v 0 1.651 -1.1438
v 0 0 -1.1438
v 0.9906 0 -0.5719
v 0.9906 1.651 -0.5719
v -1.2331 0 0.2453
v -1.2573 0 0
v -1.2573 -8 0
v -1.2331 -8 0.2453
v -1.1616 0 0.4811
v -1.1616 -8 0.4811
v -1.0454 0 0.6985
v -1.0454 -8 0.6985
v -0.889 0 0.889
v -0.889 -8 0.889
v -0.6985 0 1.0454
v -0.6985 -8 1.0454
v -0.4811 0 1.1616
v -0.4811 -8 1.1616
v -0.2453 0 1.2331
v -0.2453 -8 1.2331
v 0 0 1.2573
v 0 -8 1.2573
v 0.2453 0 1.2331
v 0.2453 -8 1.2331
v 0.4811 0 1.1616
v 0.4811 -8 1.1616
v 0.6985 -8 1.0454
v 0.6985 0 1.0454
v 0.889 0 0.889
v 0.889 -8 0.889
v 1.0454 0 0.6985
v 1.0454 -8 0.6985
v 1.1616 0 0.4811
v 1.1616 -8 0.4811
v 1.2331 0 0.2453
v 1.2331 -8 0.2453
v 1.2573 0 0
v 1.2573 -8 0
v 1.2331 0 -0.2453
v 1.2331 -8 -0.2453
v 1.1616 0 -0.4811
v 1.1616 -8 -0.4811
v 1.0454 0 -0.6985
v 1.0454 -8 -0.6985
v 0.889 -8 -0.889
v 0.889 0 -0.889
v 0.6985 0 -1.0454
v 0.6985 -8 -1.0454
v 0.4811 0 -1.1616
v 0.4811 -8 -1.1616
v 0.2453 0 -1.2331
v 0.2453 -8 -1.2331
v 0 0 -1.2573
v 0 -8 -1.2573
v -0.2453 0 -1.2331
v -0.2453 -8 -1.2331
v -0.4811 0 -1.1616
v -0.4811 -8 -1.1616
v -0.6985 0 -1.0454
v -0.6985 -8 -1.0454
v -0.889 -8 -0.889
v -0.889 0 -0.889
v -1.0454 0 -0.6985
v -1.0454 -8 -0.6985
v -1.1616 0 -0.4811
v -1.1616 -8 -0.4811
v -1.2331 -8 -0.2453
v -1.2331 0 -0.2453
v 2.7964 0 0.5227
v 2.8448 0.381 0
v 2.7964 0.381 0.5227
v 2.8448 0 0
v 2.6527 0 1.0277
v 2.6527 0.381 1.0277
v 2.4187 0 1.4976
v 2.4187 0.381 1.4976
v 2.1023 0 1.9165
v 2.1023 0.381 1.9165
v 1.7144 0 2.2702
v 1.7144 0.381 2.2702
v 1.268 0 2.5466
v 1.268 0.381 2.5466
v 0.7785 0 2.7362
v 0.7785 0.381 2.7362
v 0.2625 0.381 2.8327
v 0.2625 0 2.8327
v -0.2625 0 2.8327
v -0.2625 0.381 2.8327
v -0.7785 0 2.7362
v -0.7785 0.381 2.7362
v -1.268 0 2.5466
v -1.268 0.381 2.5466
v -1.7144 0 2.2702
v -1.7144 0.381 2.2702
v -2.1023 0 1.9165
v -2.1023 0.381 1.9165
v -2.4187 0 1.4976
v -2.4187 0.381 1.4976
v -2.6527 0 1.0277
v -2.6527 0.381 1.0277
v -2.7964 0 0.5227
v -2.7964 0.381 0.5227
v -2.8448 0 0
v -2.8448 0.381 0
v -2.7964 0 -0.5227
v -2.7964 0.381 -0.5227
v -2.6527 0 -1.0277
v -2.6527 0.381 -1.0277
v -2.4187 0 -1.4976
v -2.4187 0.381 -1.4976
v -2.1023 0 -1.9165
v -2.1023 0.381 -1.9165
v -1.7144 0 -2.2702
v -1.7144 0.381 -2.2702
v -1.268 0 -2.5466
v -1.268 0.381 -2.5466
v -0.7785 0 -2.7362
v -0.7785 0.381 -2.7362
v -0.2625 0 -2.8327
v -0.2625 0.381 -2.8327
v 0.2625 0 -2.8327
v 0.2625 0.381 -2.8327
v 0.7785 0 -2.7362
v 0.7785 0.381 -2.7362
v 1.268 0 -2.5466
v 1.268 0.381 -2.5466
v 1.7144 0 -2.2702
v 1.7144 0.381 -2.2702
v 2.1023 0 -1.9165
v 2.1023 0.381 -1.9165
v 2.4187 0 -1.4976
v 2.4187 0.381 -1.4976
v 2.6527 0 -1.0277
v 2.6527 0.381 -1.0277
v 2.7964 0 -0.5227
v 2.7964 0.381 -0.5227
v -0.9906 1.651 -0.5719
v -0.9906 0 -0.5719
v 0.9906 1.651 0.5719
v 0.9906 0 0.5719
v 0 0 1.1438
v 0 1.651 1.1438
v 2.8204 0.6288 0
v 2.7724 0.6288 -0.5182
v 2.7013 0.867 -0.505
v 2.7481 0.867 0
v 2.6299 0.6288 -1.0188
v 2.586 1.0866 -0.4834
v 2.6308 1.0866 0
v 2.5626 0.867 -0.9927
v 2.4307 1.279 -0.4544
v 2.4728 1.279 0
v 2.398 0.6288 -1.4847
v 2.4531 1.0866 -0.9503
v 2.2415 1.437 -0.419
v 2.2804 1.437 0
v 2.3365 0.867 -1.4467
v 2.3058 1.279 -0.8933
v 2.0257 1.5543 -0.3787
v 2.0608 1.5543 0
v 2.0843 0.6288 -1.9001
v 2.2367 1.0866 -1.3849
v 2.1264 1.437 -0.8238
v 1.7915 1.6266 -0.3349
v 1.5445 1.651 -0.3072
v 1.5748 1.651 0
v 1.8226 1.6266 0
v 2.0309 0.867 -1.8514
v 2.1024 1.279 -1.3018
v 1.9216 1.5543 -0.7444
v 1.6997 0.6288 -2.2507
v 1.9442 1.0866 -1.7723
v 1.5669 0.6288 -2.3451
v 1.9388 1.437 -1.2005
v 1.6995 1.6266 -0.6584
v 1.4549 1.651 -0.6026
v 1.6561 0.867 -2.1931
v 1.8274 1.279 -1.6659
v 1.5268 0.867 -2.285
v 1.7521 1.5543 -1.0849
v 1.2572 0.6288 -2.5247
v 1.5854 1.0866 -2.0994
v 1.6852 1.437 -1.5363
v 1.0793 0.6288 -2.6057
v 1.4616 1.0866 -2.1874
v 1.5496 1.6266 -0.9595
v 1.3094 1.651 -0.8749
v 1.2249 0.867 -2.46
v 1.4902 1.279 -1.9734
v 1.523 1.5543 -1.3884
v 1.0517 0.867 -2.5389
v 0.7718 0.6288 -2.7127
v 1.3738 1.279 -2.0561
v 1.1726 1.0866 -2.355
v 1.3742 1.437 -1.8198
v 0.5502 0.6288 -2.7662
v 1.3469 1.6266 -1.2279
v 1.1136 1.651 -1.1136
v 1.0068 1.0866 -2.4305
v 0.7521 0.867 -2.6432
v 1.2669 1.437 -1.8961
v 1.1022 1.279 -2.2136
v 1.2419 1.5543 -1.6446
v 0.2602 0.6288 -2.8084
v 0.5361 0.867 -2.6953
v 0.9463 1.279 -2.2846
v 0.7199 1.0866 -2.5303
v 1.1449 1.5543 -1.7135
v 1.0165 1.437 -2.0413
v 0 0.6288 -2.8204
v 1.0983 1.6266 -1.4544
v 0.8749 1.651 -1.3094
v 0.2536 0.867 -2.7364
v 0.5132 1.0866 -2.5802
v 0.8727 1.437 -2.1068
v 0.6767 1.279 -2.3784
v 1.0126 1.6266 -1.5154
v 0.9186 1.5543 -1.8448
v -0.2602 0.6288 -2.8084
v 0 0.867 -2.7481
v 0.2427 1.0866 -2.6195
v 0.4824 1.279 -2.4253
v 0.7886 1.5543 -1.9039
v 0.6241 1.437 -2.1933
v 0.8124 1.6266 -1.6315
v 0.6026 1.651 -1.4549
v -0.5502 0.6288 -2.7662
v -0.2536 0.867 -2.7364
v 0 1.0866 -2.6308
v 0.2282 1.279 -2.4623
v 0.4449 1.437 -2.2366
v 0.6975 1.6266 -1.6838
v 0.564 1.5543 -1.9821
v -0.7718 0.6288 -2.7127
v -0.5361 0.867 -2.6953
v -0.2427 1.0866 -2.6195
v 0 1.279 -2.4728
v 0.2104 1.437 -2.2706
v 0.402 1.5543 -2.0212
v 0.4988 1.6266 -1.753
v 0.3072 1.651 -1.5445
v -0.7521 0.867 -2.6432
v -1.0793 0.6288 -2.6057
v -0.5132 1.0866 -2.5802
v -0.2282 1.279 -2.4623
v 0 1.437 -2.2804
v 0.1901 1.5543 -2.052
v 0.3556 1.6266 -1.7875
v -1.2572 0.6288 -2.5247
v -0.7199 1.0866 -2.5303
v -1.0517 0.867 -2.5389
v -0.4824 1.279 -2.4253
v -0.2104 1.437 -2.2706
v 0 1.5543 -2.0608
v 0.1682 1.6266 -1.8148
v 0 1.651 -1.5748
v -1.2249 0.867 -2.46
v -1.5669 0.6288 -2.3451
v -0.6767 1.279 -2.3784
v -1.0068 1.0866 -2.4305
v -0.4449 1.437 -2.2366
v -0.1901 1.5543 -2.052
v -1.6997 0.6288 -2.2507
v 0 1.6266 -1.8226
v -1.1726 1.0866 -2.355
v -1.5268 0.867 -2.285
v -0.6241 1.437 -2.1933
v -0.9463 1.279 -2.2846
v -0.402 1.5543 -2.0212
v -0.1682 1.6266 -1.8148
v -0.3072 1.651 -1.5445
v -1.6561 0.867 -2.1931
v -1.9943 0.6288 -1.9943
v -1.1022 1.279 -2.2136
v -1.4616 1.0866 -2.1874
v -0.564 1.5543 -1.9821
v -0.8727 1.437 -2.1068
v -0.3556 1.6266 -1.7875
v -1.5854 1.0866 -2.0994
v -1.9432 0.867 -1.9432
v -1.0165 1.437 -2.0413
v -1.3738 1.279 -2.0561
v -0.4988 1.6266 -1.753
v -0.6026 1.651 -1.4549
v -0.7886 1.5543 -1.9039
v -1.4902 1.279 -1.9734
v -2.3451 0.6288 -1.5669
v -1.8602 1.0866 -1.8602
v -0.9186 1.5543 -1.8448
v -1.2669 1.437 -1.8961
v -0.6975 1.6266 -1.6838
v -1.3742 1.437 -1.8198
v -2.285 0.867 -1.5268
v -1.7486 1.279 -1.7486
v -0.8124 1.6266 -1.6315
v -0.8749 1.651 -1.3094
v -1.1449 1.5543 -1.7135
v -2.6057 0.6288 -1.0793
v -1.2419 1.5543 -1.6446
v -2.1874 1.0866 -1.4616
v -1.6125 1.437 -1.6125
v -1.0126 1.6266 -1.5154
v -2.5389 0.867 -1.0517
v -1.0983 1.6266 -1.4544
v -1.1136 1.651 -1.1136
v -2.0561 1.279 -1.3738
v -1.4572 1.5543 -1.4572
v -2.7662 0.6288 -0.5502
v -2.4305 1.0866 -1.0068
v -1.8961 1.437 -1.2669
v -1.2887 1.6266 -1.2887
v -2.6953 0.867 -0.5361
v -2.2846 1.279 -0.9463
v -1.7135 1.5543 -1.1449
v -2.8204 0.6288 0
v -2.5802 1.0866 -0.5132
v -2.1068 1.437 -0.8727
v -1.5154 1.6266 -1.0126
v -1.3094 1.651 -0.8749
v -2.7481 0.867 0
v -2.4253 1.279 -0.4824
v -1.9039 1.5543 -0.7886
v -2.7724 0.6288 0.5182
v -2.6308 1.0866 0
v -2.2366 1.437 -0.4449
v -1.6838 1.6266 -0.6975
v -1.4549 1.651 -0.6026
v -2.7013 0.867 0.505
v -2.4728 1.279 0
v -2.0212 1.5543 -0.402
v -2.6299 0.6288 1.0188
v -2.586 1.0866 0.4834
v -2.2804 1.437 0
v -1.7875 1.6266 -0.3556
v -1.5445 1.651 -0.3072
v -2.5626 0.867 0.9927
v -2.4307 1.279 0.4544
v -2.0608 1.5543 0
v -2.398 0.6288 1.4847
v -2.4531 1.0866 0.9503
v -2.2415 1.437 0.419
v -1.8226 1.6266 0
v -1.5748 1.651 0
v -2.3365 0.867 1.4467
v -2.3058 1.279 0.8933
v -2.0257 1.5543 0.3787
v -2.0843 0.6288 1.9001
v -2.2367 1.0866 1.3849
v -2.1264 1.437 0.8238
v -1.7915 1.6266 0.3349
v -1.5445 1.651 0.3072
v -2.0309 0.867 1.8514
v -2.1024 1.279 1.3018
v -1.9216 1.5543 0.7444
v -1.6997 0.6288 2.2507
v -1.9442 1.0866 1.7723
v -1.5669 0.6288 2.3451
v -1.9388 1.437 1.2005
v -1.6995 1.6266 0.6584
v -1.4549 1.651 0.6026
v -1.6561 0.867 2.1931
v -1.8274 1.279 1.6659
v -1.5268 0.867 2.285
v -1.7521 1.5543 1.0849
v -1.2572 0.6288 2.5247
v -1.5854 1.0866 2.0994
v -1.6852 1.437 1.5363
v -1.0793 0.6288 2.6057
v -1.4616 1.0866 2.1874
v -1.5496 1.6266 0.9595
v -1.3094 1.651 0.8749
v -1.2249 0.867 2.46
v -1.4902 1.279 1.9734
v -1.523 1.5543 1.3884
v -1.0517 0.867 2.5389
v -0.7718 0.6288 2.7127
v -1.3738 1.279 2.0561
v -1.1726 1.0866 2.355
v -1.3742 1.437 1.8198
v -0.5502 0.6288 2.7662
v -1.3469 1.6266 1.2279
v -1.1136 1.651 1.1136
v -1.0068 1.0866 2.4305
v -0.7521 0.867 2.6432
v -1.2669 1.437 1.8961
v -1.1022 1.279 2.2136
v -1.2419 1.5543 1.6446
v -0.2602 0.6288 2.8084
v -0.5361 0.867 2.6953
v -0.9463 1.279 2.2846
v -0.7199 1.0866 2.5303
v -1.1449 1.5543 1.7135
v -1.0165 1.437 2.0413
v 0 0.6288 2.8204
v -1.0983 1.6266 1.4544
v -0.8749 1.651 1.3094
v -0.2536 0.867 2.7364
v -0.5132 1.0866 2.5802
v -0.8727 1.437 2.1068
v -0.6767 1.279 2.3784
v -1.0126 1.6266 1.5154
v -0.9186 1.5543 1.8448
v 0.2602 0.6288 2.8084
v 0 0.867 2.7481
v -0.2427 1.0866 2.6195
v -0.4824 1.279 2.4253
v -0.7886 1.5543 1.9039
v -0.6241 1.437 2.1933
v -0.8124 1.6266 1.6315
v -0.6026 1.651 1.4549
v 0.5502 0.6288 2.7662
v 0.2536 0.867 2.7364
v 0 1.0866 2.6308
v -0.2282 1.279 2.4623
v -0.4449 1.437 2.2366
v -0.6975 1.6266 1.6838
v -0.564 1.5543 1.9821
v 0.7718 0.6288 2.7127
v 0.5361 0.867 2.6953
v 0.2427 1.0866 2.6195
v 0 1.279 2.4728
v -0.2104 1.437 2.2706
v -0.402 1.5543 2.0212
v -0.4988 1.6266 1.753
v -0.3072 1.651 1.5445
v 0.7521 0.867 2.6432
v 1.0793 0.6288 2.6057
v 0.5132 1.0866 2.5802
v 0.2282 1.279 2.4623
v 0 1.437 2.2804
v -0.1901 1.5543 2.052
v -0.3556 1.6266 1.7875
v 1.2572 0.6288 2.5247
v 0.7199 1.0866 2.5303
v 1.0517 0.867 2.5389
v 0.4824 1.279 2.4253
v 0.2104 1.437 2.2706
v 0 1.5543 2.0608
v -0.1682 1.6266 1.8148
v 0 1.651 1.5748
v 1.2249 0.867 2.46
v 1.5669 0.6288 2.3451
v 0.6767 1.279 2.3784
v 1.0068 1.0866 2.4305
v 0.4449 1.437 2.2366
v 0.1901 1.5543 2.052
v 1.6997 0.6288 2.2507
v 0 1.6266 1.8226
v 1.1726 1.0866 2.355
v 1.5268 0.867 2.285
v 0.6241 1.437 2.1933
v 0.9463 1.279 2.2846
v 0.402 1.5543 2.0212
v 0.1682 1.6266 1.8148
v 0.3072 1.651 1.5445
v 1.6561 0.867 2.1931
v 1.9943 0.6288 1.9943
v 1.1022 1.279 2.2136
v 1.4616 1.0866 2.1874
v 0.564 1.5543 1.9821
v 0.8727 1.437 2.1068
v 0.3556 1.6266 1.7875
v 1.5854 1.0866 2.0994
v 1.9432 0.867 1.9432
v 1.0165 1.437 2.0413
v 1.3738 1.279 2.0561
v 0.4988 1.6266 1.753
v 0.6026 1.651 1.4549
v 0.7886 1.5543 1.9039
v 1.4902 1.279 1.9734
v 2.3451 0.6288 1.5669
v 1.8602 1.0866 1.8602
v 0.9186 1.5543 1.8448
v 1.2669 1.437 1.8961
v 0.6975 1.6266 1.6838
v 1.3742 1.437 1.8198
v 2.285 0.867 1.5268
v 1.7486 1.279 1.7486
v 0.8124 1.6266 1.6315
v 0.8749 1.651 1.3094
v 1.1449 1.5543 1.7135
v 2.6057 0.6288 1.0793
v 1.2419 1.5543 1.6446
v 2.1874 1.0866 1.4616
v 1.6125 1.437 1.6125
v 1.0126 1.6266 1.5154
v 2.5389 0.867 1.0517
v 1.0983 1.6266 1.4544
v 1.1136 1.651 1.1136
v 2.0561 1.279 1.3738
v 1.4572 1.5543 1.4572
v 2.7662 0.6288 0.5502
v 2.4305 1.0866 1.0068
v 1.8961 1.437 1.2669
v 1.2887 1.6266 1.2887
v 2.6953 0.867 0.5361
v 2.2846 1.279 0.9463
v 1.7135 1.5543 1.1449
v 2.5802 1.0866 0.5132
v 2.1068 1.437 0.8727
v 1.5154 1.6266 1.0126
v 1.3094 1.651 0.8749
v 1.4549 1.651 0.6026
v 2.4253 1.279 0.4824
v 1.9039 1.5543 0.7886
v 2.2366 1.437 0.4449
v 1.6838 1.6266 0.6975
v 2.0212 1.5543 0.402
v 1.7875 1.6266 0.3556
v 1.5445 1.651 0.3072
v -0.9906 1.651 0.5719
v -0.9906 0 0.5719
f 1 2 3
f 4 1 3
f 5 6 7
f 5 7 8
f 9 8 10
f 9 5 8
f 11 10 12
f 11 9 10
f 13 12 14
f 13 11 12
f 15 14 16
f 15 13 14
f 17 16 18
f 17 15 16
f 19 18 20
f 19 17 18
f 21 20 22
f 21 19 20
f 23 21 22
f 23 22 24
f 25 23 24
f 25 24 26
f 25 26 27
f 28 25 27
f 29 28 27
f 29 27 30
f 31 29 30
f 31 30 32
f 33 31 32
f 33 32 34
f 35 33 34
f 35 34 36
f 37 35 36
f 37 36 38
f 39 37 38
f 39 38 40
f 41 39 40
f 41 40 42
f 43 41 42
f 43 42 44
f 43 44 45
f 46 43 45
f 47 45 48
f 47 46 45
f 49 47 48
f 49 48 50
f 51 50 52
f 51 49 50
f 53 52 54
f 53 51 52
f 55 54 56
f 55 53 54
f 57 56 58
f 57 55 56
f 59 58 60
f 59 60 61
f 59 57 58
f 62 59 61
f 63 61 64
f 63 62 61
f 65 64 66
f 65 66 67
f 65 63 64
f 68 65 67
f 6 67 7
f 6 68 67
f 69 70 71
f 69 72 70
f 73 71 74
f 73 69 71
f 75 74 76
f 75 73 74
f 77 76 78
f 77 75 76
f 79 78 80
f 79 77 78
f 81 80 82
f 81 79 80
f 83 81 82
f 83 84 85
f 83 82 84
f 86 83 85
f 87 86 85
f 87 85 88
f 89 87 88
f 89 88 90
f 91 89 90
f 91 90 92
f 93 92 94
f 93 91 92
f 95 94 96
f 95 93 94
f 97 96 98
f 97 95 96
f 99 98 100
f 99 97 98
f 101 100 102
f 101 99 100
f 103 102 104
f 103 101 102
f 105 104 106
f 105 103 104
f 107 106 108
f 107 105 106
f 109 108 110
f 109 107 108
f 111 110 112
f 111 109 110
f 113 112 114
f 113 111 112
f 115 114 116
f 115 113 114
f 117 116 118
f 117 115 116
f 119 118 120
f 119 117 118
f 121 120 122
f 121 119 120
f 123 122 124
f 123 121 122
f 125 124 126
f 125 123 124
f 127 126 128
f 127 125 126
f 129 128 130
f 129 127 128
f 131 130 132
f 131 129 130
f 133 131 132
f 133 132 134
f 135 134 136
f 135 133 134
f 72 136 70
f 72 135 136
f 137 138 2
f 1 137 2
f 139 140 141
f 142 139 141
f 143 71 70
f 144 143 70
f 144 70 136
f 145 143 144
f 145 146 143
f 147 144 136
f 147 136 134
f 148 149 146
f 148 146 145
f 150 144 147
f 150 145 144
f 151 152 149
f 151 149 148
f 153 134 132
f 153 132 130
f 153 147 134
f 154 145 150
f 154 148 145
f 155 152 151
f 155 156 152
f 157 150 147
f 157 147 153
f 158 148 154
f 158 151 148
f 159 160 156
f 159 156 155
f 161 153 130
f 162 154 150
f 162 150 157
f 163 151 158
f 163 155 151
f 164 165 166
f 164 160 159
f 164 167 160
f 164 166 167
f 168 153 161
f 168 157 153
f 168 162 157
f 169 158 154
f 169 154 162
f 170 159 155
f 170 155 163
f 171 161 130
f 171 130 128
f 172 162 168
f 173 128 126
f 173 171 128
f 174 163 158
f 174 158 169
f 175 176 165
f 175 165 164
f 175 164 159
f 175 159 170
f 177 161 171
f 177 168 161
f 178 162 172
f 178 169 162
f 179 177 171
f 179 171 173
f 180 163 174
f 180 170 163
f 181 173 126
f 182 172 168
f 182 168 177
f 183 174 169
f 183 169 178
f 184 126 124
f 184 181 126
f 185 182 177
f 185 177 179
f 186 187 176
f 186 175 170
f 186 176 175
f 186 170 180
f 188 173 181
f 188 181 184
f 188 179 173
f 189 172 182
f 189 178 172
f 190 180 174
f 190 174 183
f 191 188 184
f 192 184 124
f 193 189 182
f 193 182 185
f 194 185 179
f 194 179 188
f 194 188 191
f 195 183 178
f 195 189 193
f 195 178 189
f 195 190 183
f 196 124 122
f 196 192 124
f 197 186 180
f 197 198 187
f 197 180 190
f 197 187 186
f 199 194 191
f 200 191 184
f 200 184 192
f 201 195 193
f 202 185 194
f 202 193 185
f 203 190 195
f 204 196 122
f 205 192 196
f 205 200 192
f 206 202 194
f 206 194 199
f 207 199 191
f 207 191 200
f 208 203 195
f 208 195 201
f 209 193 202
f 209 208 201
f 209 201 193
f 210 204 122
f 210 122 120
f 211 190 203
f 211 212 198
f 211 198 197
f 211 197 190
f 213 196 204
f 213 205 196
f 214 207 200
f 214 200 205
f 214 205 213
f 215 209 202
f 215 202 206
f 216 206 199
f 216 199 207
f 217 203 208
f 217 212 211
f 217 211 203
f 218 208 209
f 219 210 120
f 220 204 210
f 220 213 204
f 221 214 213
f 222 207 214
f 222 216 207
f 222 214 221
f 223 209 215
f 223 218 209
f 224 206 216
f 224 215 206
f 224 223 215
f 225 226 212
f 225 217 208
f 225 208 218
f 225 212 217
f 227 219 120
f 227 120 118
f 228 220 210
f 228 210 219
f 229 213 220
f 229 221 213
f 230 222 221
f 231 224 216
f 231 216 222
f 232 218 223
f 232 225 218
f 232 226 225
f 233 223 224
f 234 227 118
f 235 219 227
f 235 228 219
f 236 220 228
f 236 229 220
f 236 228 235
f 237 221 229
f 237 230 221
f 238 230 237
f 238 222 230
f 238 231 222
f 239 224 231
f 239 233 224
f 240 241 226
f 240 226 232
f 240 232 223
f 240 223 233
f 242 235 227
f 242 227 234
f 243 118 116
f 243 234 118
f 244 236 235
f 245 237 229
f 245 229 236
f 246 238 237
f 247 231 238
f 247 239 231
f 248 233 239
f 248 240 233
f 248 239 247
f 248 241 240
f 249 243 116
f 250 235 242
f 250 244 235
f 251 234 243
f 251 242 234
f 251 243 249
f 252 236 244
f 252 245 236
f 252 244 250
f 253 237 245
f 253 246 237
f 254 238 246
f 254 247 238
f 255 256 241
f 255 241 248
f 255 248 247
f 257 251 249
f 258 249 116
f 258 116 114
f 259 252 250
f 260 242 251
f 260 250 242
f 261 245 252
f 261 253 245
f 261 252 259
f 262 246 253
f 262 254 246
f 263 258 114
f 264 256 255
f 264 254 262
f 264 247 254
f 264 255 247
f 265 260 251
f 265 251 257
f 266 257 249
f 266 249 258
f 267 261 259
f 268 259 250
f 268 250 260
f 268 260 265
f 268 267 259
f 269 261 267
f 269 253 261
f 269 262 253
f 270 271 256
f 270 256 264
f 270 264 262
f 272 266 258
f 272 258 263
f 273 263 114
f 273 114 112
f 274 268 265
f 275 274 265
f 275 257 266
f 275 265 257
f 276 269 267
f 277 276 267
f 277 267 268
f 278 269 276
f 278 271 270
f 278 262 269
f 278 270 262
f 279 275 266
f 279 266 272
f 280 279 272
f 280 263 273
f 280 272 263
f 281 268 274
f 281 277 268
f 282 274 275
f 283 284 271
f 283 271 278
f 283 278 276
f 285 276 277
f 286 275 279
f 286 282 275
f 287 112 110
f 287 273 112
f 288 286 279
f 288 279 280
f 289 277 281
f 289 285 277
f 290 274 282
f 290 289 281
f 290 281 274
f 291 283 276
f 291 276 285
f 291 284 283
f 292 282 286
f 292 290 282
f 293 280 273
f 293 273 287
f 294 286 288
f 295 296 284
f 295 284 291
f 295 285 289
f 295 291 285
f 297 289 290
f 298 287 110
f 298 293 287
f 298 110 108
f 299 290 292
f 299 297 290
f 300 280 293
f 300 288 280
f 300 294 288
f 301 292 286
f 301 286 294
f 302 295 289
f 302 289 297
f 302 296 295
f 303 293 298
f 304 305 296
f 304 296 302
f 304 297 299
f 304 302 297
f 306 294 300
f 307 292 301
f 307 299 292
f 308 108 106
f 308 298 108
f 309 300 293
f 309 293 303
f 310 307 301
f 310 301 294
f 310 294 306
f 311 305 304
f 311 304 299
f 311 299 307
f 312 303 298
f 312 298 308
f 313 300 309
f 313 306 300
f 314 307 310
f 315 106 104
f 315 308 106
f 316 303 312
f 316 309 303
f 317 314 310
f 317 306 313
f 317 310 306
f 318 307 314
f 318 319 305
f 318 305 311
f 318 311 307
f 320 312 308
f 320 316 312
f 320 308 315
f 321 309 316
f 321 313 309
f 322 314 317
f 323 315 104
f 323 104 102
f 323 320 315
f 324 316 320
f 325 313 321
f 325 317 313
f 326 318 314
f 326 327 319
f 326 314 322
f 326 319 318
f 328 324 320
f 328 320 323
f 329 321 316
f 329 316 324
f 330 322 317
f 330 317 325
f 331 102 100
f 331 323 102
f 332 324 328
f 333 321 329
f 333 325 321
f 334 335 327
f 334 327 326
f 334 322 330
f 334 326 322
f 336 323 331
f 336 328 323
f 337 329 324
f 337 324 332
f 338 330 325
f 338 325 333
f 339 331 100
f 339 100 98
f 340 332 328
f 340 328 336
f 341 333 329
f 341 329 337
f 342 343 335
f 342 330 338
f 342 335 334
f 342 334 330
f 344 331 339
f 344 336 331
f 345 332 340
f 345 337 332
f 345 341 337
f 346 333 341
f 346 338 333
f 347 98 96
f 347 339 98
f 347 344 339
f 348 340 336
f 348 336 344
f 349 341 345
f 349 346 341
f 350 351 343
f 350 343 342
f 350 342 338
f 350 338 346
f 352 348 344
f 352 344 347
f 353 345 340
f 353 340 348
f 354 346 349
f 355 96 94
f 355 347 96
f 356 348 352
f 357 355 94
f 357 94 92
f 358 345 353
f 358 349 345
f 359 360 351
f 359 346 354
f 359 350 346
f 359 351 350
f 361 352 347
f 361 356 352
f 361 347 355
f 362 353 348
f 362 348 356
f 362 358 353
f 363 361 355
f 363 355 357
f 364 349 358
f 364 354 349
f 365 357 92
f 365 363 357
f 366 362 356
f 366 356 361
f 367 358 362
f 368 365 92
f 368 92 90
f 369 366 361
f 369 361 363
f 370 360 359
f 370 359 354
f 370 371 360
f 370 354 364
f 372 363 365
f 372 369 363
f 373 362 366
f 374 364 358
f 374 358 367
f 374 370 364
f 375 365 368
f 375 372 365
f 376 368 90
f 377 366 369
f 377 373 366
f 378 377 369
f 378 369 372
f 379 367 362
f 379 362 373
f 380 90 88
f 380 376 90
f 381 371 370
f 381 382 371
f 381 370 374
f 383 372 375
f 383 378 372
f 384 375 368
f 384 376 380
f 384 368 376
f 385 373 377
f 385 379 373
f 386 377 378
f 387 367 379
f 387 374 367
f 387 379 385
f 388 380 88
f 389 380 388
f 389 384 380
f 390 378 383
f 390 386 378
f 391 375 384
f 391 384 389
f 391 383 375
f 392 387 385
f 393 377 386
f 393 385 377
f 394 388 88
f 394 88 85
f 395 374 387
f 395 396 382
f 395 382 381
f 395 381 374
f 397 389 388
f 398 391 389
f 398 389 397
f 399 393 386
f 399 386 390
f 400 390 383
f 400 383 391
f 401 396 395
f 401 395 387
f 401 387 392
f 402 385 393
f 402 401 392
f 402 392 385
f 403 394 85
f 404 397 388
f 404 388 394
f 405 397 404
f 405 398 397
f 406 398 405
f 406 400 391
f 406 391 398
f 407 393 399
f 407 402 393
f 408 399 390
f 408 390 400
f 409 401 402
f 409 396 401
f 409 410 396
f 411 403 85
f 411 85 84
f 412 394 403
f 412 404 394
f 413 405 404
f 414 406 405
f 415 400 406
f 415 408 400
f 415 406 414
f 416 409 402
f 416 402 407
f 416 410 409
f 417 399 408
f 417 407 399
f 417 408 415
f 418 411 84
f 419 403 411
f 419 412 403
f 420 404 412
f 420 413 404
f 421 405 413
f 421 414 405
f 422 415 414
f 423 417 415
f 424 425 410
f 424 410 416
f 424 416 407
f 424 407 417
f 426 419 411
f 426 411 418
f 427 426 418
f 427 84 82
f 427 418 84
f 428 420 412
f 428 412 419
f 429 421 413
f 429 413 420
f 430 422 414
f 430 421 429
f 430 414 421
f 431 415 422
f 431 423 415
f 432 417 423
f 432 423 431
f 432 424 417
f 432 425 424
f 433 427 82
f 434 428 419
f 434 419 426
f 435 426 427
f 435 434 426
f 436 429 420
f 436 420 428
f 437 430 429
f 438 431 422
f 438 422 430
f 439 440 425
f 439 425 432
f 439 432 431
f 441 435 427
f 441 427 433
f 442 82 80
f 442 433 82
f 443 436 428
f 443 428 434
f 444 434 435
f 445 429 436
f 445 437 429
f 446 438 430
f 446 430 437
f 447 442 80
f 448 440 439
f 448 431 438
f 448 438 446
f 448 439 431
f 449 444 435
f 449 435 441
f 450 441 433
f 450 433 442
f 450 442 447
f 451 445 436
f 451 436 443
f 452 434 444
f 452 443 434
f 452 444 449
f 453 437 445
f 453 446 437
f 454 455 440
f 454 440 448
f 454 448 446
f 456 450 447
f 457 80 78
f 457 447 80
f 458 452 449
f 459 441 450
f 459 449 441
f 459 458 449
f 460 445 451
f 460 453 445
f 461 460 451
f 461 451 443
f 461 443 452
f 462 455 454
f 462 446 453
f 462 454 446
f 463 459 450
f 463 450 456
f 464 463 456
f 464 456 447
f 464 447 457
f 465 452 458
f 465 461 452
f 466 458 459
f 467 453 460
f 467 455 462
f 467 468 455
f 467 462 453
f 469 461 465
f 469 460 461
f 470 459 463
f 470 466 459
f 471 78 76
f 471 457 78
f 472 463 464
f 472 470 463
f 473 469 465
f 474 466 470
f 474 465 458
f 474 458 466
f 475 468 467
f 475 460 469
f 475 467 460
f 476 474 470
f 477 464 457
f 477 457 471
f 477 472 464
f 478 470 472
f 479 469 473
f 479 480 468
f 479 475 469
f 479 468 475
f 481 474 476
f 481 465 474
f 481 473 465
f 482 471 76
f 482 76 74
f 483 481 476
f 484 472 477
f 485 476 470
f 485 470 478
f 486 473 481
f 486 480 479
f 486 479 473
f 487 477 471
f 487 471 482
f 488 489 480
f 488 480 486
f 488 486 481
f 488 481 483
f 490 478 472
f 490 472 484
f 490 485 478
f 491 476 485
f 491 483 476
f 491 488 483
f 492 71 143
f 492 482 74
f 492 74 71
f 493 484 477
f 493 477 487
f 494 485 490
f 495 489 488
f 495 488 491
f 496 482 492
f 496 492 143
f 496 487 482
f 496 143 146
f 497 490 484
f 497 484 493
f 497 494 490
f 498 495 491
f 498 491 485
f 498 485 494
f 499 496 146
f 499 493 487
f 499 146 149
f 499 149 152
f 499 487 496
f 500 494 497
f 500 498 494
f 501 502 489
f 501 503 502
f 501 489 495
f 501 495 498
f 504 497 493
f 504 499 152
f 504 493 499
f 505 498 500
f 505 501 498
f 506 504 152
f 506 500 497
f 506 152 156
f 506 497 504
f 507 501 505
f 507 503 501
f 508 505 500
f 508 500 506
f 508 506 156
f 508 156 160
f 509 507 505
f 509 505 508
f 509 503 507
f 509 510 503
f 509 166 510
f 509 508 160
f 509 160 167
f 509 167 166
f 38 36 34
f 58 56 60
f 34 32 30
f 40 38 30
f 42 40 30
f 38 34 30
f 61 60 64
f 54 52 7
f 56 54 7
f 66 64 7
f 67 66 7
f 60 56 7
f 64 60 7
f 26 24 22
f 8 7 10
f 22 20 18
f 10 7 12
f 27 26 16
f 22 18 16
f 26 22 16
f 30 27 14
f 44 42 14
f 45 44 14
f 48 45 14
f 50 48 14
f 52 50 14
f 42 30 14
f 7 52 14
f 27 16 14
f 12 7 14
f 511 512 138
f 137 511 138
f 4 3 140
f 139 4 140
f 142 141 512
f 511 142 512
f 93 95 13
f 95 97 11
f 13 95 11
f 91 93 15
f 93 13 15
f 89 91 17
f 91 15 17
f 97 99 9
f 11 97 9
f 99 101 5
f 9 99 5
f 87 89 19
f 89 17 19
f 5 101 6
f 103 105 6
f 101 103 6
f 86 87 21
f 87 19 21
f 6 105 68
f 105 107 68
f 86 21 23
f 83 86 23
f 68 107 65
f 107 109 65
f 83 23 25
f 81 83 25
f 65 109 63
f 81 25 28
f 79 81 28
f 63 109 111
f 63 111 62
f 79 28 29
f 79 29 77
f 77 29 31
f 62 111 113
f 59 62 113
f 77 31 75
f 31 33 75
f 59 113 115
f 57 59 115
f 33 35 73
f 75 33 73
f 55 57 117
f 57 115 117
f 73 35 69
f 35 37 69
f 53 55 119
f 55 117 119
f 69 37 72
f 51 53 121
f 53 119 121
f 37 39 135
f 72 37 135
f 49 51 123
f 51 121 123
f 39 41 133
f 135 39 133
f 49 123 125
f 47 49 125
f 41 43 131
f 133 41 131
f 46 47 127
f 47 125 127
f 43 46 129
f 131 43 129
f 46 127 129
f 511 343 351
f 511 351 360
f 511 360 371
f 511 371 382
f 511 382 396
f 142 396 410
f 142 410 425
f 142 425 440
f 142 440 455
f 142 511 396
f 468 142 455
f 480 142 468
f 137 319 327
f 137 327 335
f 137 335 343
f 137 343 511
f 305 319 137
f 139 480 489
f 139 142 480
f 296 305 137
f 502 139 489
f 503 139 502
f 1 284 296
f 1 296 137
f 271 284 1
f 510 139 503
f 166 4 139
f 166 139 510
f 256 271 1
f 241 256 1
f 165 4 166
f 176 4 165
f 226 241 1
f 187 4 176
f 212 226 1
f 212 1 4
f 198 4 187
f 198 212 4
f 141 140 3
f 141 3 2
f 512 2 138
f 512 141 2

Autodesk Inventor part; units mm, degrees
ref_plane "YZ Plane" through (0, 0, 0) normal (1, 0, 0) x (0, 1, 0)
ref_plane "XZ Plane" through (0, 0, 0) normal (0, 1, 0) x (-1, 0, 0)
ref_plane "XY Plane" through (0, 0, 0) normal (0, 0, 1) x (1, 0, 0)
sketch "Sketch1" plane through (0, 0, 0) normal (0, 1, 0) x (-1, 0, 0)
  circle A0 centre (0, 0) radius 1.2573
  dimension "d0" = 2.5146
extrude "Extrusion1" add sketch "Sketch1" against normal blind 8
sketch "Sketch2" plane through (0, 0, 0) normal (0, 1, 0) x (1, 0, 0)
  circle A0 centre (0, 0) radius 1.2573 projected
  circle A1 centre (0, 0) radius 2.8448
  line L0 (0, 0) -> (0.9906, 0)
  line L1 (0.9906, -0.5719) -> (0, -1.1438)
  line L2 (0, -1.1438) -> (-0.9906, -0.5719)
  line L3 (-0.9906, -0.5719) -> (-0.9906, 0.5719)
  line L4 (-0.9906, 0.5719) -> (0, 1.1438)
  line L5 (0, 1.1438) -> (0.9906, 0.5719)
  line L6 (0.9906, 0.5719) -> (0.9906, -0.5719)
  dimension "d7" = 0.9906
extrude "Extrusion2" add sketch "Sketch2" along normal blind 1.651 contours A0 | A1
fillet "Fillet1" radius 1.27 1 edges at (-2.8448, 1.651, 0)
thread "Thread1" size "M3x0.5" class "6g" standard "ANSI Metric M Profile" full length
properties part number "m3x8"
